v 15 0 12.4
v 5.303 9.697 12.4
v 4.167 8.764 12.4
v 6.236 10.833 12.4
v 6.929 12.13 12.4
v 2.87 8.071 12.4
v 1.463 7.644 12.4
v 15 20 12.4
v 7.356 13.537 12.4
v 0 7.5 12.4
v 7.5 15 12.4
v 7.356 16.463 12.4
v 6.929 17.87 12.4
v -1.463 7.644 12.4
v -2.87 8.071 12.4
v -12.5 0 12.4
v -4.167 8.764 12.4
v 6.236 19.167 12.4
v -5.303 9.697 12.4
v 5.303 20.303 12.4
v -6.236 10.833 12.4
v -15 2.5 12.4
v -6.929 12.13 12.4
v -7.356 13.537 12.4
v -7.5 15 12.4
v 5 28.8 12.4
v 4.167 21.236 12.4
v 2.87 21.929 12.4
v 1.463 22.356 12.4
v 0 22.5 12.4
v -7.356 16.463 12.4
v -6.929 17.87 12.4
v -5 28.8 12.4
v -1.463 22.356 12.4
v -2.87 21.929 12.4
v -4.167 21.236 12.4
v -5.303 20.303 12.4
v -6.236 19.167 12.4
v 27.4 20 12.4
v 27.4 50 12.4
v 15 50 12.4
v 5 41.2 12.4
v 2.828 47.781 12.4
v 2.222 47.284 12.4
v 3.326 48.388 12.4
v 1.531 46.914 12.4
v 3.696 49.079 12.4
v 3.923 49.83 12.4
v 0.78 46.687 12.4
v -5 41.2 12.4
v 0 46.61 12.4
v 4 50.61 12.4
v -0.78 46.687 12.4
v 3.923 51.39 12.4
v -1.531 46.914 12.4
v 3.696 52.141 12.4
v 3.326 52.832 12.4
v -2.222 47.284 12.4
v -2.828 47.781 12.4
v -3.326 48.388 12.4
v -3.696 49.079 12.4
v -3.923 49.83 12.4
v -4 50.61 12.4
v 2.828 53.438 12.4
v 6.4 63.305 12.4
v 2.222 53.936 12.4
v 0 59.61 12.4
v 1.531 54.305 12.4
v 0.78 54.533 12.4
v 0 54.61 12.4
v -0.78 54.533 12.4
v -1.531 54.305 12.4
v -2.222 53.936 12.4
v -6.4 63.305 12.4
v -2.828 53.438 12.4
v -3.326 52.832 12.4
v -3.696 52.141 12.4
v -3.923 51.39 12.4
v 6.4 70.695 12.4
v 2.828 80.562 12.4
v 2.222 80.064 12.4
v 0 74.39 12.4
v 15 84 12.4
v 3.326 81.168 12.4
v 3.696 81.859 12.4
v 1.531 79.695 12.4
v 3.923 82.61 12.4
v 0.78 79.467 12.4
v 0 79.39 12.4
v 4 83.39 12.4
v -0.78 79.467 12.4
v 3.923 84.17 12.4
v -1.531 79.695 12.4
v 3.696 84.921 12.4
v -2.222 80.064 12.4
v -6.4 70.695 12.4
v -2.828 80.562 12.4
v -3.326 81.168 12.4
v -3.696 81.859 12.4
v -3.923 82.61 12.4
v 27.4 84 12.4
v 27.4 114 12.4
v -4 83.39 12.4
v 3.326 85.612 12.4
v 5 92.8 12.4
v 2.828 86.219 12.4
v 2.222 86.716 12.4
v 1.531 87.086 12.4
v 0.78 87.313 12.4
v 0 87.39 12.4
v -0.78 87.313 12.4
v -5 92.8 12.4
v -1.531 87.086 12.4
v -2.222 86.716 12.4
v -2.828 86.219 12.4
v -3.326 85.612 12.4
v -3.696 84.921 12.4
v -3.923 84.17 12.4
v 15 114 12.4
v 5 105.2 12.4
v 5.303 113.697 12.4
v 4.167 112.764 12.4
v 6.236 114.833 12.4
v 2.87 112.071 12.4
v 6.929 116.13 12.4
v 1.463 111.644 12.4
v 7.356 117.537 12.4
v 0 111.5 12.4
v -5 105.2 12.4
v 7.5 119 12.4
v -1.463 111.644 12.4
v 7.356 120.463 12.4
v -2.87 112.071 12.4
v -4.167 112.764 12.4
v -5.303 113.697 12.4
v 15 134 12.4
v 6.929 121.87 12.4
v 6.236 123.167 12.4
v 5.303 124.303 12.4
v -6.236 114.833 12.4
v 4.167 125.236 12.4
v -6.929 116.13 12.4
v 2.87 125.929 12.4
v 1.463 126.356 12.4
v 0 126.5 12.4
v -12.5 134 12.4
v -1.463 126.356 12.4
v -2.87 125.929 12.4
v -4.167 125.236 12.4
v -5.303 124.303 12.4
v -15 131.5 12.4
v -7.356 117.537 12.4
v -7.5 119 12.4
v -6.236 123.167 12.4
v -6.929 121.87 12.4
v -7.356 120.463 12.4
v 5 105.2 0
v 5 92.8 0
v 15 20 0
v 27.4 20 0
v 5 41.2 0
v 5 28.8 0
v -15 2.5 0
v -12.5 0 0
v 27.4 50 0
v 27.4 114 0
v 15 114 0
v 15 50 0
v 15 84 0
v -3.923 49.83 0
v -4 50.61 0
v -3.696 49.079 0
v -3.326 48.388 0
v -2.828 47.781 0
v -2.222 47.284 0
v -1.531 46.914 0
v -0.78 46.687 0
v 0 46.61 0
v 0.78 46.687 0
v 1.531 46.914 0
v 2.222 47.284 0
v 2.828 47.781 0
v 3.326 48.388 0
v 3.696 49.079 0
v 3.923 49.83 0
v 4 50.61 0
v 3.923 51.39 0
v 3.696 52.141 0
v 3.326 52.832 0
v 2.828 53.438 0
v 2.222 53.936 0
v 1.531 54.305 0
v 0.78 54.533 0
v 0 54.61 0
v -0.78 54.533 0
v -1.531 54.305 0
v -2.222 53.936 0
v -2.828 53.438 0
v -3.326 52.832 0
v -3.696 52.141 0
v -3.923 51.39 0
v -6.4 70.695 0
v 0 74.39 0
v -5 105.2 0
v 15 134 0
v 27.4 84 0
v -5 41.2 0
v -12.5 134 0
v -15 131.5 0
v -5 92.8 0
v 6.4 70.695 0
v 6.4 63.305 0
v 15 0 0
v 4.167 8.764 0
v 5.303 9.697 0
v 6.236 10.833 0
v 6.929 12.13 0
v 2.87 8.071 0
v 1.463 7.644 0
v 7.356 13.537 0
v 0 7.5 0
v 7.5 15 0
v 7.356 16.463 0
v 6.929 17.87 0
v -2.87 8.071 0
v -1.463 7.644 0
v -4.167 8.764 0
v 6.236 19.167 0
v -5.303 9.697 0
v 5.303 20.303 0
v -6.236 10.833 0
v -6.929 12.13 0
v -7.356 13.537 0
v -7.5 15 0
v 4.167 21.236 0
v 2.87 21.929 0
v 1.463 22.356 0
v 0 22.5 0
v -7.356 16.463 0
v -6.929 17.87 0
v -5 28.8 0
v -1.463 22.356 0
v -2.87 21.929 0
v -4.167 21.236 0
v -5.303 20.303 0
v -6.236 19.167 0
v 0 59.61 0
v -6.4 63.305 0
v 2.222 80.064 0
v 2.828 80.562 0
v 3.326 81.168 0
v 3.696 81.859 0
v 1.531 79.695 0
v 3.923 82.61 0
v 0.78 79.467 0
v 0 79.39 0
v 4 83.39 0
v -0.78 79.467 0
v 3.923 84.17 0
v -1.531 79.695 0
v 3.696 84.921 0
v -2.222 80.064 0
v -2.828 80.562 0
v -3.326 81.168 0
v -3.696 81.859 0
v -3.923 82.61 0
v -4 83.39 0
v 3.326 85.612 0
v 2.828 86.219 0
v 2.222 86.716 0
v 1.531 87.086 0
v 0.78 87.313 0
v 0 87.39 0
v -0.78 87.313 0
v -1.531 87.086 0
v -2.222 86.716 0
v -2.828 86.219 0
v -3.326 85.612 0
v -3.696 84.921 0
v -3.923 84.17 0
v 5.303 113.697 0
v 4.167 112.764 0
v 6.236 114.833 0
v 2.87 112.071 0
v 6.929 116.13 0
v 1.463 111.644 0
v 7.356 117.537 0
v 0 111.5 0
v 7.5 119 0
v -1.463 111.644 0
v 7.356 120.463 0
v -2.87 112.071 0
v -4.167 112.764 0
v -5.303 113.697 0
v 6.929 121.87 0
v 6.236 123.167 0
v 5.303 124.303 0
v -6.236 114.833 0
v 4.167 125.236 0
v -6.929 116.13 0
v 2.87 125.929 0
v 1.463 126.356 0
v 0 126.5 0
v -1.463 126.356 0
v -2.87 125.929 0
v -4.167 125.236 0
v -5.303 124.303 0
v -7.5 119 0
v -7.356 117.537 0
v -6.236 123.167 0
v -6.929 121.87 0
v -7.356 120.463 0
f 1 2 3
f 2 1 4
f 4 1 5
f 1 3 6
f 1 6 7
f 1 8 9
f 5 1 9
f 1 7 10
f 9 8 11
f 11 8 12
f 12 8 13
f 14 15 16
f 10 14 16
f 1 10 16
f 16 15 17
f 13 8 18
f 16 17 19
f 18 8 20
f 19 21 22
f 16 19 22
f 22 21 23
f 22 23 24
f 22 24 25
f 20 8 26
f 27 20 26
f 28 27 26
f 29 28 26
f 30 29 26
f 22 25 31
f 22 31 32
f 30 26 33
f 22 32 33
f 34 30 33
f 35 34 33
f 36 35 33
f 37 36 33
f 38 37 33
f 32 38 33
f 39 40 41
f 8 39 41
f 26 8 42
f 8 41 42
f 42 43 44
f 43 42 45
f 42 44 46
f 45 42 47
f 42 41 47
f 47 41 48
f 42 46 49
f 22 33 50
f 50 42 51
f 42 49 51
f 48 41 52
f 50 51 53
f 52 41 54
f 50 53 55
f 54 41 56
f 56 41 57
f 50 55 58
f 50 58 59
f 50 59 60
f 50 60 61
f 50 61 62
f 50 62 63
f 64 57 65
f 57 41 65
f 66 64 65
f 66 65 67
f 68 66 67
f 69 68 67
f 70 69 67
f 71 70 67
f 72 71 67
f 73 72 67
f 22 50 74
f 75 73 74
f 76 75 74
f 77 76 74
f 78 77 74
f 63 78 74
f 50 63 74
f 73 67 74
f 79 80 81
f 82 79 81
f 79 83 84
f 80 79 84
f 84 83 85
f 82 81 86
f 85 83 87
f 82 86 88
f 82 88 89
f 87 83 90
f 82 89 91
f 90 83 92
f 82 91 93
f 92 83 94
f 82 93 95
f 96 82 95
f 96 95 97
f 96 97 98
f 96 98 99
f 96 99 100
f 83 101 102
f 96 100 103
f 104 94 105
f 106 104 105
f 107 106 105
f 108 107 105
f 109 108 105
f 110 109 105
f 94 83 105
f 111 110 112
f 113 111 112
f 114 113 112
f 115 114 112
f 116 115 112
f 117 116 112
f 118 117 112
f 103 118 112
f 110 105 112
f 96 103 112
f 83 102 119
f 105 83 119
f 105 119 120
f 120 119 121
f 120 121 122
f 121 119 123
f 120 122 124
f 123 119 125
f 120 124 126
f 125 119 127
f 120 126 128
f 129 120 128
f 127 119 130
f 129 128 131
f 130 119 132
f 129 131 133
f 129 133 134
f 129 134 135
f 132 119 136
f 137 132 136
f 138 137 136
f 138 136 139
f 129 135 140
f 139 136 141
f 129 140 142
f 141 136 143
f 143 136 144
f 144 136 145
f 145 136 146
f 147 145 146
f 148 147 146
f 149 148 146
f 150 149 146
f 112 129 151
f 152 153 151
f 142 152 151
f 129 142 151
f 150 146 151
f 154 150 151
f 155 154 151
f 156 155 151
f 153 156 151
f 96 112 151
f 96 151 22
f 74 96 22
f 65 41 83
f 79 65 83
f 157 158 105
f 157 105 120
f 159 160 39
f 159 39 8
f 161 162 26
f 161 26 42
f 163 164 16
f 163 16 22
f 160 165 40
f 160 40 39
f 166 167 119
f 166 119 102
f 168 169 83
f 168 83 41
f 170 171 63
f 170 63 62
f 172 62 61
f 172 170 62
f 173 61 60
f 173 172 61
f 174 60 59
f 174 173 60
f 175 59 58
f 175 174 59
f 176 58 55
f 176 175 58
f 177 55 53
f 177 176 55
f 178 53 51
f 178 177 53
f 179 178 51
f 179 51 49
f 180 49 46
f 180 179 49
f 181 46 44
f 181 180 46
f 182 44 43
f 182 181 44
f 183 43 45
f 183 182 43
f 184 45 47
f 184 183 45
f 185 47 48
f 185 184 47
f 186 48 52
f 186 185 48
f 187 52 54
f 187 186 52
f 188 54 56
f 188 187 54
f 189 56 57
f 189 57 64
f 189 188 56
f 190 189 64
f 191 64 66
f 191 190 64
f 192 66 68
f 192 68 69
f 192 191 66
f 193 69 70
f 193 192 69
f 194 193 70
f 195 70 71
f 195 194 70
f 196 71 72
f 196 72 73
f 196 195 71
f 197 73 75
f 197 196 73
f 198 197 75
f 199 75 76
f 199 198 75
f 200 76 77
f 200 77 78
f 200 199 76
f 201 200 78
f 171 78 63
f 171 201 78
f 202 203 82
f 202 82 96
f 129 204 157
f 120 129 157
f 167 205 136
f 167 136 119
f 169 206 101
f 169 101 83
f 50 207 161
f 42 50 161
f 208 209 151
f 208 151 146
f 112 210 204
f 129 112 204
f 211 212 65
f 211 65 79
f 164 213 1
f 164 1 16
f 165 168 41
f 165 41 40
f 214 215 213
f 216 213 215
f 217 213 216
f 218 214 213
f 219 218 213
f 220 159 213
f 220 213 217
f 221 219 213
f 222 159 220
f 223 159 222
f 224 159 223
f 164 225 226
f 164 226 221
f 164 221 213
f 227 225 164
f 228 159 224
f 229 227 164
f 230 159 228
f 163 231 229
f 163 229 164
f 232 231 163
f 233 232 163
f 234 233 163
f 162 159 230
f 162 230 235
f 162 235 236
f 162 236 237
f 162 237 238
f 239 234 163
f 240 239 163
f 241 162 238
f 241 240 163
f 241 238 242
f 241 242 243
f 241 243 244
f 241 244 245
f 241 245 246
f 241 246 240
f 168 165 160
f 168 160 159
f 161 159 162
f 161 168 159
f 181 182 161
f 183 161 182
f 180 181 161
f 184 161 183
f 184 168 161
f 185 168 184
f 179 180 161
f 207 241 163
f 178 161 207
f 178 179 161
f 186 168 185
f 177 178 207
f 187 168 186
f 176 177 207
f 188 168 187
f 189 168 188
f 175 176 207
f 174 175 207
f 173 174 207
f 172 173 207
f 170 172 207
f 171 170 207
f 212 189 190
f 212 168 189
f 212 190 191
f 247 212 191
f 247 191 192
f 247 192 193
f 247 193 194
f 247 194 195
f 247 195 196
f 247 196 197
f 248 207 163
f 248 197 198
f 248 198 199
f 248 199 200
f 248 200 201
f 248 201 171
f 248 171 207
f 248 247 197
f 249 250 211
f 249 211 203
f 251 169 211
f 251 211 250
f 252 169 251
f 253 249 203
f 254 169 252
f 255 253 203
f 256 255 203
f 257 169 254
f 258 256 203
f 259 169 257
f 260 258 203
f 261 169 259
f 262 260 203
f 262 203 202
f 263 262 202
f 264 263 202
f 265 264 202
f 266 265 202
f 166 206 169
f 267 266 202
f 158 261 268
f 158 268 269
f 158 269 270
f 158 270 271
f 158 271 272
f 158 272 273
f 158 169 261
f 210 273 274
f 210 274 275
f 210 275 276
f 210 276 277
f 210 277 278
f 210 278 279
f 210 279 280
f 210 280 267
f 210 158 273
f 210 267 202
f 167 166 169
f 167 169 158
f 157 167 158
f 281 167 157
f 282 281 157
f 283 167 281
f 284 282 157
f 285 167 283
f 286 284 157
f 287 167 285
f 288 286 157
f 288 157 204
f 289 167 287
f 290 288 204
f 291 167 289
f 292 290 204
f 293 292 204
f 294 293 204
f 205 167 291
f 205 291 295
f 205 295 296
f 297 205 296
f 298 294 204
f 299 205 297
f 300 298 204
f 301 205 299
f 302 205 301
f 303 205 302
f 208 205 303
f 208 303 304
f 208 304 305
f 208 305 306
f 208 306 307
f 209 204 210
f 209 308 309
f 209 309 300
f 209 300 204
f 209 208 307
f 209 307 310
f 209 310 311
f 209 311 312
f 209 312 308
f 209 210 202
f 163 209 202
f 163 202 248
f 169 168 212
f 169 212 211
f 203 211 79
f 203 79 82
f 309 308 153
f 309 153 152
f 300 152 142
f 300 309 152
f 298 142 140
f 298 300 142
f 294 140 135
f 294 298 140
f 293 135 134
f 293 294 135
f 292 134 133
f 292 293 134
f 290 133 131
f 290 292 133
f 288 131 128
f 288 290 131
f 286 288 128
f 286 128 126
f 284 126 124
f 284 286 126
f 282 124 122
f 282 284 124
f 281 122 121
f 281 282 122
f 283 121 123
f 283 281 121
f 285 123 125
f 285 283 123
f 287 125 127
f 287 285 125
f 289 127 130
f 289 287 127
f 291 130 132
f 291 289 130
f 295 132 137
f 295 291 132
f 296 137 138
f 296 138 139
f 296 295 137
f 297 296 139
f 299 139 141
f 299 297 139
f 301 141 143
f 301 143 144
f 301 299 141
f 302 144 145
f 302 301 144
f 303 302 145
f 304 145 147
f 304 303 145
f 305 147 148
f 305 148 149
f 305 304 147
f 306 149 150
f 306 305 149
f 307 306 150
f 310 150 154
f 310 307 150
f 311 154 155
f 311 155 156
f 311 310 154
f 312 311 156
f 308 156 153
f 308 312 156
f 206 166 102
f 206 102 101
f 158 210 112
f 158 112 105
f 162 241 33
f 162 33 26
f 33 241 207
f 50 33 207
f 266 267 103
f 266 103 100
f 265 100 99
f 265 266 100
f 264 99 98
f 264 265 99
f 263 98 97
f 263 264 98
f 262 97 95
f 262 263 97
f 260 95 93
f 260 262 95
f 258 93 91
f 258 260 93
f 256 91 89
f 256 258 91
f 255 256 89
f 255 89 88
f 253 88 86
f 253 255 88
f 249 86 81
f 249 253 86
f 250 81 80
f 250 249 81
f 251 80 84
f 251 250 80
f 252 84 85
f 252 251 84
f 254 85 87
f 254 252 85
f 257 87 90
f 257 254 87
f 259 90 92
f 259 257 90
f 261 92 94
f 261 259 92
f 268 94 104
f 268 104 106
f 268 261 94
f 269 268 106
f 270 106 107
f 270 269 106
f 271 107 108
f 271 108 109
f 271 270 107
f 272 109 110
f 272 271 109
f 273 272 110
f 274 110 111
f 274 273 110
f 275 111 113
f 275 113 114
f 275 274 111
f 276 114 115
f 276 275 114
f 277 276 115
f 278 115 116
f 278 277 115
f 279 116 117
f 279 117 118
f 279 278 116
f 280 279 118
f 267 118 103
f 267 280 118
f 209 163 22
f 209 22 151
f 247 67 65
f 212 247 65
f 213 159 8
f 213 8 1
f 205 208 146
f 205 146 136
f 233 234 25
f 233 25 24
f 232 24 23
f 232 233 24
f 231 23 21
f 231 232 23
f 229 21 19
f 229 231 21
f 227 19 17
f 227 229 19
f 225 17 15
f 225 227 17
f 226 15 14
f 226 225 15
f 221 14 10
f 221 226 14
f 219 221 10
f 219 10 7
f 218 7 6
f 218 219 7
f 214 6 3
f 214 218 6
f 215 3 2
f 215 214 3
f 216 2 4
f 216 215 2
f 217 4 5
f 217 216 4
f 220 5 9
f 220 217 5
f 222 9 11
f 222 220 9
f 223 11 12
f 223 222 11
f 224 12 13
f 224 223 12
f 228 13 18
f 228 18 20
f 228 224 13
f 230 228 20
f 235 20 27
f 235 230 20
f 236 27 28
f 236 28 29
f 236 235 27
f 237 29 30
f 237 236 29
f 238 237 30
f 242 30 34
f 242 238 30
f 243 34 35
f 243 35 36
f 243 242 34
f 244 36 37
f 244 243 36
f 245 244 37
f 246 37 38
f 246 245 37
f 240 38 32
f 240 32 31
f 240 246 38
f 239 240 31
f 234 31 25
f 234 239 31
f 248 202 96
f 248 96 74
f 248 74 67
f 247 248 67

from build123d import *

# Parameters (mm, degrees)
MODEL_R             = 4
MODEL_R_2           = 7.5
MODEL_W             = 10
MODEL_H             = 12.4
BOSS_EXTRUDE1_DEPTH = 12.4


with BuildPart() as part:
    # Model → Boss-Extrude1 (new body)
    with BuildSketch(Plane.XY):
        Polygon((-12.5, 0), (-15, 2.5), (-15, 131.5), (-12.5, 134), (15, 134), (15, 114), (27.4, 114), (27.4, 84), (15, 84), (15, 50), (27.4, 50), (27.4, 20), (15, 20), (15, 0), align=None)
        with Locations(Location((0, 50.609916554, 0), (0, 0, 180))):
            Circle(MODEL_R, mode=Mode.SUBTRACT)
        with Locations(Location((0, 83.390083446, 0), (0, 0, 180))):
            Circle(MODEL_R, mode=Mode.SUBTRACT)
        with Locations(Location((0, 15, 0), (0, 0, 180))):
            Circle(MODEL_R_2, mode=Mode.SUBTRACT)
        with Locations(Location((0, 119, 0), (0, 0, 180))):
            Circle(MODEL_R_2, mode=Mode.SUBTRACT)
        with Locations((0, 99)):
            Rectangle(MODEL_W, MODEL_H, mode=Mode.SUBTRACT)
        Polygon((0, 74.390083446), (-6.4, 70.695041723), (-6.4, 63.304958277), (0, 59.609916554), (6.4, 63.304958277), (6.4, 70.695041723), align=None, mode=Mode.SUBTRACT)
        with Locations((0, 35)):
            Rectangle(MODEL_W, MODEL_H, mode=Mode.SUBTRACT)
    extrude(amount=BOSS_EXTRUDE1_DEPTH)


solid = part.part
